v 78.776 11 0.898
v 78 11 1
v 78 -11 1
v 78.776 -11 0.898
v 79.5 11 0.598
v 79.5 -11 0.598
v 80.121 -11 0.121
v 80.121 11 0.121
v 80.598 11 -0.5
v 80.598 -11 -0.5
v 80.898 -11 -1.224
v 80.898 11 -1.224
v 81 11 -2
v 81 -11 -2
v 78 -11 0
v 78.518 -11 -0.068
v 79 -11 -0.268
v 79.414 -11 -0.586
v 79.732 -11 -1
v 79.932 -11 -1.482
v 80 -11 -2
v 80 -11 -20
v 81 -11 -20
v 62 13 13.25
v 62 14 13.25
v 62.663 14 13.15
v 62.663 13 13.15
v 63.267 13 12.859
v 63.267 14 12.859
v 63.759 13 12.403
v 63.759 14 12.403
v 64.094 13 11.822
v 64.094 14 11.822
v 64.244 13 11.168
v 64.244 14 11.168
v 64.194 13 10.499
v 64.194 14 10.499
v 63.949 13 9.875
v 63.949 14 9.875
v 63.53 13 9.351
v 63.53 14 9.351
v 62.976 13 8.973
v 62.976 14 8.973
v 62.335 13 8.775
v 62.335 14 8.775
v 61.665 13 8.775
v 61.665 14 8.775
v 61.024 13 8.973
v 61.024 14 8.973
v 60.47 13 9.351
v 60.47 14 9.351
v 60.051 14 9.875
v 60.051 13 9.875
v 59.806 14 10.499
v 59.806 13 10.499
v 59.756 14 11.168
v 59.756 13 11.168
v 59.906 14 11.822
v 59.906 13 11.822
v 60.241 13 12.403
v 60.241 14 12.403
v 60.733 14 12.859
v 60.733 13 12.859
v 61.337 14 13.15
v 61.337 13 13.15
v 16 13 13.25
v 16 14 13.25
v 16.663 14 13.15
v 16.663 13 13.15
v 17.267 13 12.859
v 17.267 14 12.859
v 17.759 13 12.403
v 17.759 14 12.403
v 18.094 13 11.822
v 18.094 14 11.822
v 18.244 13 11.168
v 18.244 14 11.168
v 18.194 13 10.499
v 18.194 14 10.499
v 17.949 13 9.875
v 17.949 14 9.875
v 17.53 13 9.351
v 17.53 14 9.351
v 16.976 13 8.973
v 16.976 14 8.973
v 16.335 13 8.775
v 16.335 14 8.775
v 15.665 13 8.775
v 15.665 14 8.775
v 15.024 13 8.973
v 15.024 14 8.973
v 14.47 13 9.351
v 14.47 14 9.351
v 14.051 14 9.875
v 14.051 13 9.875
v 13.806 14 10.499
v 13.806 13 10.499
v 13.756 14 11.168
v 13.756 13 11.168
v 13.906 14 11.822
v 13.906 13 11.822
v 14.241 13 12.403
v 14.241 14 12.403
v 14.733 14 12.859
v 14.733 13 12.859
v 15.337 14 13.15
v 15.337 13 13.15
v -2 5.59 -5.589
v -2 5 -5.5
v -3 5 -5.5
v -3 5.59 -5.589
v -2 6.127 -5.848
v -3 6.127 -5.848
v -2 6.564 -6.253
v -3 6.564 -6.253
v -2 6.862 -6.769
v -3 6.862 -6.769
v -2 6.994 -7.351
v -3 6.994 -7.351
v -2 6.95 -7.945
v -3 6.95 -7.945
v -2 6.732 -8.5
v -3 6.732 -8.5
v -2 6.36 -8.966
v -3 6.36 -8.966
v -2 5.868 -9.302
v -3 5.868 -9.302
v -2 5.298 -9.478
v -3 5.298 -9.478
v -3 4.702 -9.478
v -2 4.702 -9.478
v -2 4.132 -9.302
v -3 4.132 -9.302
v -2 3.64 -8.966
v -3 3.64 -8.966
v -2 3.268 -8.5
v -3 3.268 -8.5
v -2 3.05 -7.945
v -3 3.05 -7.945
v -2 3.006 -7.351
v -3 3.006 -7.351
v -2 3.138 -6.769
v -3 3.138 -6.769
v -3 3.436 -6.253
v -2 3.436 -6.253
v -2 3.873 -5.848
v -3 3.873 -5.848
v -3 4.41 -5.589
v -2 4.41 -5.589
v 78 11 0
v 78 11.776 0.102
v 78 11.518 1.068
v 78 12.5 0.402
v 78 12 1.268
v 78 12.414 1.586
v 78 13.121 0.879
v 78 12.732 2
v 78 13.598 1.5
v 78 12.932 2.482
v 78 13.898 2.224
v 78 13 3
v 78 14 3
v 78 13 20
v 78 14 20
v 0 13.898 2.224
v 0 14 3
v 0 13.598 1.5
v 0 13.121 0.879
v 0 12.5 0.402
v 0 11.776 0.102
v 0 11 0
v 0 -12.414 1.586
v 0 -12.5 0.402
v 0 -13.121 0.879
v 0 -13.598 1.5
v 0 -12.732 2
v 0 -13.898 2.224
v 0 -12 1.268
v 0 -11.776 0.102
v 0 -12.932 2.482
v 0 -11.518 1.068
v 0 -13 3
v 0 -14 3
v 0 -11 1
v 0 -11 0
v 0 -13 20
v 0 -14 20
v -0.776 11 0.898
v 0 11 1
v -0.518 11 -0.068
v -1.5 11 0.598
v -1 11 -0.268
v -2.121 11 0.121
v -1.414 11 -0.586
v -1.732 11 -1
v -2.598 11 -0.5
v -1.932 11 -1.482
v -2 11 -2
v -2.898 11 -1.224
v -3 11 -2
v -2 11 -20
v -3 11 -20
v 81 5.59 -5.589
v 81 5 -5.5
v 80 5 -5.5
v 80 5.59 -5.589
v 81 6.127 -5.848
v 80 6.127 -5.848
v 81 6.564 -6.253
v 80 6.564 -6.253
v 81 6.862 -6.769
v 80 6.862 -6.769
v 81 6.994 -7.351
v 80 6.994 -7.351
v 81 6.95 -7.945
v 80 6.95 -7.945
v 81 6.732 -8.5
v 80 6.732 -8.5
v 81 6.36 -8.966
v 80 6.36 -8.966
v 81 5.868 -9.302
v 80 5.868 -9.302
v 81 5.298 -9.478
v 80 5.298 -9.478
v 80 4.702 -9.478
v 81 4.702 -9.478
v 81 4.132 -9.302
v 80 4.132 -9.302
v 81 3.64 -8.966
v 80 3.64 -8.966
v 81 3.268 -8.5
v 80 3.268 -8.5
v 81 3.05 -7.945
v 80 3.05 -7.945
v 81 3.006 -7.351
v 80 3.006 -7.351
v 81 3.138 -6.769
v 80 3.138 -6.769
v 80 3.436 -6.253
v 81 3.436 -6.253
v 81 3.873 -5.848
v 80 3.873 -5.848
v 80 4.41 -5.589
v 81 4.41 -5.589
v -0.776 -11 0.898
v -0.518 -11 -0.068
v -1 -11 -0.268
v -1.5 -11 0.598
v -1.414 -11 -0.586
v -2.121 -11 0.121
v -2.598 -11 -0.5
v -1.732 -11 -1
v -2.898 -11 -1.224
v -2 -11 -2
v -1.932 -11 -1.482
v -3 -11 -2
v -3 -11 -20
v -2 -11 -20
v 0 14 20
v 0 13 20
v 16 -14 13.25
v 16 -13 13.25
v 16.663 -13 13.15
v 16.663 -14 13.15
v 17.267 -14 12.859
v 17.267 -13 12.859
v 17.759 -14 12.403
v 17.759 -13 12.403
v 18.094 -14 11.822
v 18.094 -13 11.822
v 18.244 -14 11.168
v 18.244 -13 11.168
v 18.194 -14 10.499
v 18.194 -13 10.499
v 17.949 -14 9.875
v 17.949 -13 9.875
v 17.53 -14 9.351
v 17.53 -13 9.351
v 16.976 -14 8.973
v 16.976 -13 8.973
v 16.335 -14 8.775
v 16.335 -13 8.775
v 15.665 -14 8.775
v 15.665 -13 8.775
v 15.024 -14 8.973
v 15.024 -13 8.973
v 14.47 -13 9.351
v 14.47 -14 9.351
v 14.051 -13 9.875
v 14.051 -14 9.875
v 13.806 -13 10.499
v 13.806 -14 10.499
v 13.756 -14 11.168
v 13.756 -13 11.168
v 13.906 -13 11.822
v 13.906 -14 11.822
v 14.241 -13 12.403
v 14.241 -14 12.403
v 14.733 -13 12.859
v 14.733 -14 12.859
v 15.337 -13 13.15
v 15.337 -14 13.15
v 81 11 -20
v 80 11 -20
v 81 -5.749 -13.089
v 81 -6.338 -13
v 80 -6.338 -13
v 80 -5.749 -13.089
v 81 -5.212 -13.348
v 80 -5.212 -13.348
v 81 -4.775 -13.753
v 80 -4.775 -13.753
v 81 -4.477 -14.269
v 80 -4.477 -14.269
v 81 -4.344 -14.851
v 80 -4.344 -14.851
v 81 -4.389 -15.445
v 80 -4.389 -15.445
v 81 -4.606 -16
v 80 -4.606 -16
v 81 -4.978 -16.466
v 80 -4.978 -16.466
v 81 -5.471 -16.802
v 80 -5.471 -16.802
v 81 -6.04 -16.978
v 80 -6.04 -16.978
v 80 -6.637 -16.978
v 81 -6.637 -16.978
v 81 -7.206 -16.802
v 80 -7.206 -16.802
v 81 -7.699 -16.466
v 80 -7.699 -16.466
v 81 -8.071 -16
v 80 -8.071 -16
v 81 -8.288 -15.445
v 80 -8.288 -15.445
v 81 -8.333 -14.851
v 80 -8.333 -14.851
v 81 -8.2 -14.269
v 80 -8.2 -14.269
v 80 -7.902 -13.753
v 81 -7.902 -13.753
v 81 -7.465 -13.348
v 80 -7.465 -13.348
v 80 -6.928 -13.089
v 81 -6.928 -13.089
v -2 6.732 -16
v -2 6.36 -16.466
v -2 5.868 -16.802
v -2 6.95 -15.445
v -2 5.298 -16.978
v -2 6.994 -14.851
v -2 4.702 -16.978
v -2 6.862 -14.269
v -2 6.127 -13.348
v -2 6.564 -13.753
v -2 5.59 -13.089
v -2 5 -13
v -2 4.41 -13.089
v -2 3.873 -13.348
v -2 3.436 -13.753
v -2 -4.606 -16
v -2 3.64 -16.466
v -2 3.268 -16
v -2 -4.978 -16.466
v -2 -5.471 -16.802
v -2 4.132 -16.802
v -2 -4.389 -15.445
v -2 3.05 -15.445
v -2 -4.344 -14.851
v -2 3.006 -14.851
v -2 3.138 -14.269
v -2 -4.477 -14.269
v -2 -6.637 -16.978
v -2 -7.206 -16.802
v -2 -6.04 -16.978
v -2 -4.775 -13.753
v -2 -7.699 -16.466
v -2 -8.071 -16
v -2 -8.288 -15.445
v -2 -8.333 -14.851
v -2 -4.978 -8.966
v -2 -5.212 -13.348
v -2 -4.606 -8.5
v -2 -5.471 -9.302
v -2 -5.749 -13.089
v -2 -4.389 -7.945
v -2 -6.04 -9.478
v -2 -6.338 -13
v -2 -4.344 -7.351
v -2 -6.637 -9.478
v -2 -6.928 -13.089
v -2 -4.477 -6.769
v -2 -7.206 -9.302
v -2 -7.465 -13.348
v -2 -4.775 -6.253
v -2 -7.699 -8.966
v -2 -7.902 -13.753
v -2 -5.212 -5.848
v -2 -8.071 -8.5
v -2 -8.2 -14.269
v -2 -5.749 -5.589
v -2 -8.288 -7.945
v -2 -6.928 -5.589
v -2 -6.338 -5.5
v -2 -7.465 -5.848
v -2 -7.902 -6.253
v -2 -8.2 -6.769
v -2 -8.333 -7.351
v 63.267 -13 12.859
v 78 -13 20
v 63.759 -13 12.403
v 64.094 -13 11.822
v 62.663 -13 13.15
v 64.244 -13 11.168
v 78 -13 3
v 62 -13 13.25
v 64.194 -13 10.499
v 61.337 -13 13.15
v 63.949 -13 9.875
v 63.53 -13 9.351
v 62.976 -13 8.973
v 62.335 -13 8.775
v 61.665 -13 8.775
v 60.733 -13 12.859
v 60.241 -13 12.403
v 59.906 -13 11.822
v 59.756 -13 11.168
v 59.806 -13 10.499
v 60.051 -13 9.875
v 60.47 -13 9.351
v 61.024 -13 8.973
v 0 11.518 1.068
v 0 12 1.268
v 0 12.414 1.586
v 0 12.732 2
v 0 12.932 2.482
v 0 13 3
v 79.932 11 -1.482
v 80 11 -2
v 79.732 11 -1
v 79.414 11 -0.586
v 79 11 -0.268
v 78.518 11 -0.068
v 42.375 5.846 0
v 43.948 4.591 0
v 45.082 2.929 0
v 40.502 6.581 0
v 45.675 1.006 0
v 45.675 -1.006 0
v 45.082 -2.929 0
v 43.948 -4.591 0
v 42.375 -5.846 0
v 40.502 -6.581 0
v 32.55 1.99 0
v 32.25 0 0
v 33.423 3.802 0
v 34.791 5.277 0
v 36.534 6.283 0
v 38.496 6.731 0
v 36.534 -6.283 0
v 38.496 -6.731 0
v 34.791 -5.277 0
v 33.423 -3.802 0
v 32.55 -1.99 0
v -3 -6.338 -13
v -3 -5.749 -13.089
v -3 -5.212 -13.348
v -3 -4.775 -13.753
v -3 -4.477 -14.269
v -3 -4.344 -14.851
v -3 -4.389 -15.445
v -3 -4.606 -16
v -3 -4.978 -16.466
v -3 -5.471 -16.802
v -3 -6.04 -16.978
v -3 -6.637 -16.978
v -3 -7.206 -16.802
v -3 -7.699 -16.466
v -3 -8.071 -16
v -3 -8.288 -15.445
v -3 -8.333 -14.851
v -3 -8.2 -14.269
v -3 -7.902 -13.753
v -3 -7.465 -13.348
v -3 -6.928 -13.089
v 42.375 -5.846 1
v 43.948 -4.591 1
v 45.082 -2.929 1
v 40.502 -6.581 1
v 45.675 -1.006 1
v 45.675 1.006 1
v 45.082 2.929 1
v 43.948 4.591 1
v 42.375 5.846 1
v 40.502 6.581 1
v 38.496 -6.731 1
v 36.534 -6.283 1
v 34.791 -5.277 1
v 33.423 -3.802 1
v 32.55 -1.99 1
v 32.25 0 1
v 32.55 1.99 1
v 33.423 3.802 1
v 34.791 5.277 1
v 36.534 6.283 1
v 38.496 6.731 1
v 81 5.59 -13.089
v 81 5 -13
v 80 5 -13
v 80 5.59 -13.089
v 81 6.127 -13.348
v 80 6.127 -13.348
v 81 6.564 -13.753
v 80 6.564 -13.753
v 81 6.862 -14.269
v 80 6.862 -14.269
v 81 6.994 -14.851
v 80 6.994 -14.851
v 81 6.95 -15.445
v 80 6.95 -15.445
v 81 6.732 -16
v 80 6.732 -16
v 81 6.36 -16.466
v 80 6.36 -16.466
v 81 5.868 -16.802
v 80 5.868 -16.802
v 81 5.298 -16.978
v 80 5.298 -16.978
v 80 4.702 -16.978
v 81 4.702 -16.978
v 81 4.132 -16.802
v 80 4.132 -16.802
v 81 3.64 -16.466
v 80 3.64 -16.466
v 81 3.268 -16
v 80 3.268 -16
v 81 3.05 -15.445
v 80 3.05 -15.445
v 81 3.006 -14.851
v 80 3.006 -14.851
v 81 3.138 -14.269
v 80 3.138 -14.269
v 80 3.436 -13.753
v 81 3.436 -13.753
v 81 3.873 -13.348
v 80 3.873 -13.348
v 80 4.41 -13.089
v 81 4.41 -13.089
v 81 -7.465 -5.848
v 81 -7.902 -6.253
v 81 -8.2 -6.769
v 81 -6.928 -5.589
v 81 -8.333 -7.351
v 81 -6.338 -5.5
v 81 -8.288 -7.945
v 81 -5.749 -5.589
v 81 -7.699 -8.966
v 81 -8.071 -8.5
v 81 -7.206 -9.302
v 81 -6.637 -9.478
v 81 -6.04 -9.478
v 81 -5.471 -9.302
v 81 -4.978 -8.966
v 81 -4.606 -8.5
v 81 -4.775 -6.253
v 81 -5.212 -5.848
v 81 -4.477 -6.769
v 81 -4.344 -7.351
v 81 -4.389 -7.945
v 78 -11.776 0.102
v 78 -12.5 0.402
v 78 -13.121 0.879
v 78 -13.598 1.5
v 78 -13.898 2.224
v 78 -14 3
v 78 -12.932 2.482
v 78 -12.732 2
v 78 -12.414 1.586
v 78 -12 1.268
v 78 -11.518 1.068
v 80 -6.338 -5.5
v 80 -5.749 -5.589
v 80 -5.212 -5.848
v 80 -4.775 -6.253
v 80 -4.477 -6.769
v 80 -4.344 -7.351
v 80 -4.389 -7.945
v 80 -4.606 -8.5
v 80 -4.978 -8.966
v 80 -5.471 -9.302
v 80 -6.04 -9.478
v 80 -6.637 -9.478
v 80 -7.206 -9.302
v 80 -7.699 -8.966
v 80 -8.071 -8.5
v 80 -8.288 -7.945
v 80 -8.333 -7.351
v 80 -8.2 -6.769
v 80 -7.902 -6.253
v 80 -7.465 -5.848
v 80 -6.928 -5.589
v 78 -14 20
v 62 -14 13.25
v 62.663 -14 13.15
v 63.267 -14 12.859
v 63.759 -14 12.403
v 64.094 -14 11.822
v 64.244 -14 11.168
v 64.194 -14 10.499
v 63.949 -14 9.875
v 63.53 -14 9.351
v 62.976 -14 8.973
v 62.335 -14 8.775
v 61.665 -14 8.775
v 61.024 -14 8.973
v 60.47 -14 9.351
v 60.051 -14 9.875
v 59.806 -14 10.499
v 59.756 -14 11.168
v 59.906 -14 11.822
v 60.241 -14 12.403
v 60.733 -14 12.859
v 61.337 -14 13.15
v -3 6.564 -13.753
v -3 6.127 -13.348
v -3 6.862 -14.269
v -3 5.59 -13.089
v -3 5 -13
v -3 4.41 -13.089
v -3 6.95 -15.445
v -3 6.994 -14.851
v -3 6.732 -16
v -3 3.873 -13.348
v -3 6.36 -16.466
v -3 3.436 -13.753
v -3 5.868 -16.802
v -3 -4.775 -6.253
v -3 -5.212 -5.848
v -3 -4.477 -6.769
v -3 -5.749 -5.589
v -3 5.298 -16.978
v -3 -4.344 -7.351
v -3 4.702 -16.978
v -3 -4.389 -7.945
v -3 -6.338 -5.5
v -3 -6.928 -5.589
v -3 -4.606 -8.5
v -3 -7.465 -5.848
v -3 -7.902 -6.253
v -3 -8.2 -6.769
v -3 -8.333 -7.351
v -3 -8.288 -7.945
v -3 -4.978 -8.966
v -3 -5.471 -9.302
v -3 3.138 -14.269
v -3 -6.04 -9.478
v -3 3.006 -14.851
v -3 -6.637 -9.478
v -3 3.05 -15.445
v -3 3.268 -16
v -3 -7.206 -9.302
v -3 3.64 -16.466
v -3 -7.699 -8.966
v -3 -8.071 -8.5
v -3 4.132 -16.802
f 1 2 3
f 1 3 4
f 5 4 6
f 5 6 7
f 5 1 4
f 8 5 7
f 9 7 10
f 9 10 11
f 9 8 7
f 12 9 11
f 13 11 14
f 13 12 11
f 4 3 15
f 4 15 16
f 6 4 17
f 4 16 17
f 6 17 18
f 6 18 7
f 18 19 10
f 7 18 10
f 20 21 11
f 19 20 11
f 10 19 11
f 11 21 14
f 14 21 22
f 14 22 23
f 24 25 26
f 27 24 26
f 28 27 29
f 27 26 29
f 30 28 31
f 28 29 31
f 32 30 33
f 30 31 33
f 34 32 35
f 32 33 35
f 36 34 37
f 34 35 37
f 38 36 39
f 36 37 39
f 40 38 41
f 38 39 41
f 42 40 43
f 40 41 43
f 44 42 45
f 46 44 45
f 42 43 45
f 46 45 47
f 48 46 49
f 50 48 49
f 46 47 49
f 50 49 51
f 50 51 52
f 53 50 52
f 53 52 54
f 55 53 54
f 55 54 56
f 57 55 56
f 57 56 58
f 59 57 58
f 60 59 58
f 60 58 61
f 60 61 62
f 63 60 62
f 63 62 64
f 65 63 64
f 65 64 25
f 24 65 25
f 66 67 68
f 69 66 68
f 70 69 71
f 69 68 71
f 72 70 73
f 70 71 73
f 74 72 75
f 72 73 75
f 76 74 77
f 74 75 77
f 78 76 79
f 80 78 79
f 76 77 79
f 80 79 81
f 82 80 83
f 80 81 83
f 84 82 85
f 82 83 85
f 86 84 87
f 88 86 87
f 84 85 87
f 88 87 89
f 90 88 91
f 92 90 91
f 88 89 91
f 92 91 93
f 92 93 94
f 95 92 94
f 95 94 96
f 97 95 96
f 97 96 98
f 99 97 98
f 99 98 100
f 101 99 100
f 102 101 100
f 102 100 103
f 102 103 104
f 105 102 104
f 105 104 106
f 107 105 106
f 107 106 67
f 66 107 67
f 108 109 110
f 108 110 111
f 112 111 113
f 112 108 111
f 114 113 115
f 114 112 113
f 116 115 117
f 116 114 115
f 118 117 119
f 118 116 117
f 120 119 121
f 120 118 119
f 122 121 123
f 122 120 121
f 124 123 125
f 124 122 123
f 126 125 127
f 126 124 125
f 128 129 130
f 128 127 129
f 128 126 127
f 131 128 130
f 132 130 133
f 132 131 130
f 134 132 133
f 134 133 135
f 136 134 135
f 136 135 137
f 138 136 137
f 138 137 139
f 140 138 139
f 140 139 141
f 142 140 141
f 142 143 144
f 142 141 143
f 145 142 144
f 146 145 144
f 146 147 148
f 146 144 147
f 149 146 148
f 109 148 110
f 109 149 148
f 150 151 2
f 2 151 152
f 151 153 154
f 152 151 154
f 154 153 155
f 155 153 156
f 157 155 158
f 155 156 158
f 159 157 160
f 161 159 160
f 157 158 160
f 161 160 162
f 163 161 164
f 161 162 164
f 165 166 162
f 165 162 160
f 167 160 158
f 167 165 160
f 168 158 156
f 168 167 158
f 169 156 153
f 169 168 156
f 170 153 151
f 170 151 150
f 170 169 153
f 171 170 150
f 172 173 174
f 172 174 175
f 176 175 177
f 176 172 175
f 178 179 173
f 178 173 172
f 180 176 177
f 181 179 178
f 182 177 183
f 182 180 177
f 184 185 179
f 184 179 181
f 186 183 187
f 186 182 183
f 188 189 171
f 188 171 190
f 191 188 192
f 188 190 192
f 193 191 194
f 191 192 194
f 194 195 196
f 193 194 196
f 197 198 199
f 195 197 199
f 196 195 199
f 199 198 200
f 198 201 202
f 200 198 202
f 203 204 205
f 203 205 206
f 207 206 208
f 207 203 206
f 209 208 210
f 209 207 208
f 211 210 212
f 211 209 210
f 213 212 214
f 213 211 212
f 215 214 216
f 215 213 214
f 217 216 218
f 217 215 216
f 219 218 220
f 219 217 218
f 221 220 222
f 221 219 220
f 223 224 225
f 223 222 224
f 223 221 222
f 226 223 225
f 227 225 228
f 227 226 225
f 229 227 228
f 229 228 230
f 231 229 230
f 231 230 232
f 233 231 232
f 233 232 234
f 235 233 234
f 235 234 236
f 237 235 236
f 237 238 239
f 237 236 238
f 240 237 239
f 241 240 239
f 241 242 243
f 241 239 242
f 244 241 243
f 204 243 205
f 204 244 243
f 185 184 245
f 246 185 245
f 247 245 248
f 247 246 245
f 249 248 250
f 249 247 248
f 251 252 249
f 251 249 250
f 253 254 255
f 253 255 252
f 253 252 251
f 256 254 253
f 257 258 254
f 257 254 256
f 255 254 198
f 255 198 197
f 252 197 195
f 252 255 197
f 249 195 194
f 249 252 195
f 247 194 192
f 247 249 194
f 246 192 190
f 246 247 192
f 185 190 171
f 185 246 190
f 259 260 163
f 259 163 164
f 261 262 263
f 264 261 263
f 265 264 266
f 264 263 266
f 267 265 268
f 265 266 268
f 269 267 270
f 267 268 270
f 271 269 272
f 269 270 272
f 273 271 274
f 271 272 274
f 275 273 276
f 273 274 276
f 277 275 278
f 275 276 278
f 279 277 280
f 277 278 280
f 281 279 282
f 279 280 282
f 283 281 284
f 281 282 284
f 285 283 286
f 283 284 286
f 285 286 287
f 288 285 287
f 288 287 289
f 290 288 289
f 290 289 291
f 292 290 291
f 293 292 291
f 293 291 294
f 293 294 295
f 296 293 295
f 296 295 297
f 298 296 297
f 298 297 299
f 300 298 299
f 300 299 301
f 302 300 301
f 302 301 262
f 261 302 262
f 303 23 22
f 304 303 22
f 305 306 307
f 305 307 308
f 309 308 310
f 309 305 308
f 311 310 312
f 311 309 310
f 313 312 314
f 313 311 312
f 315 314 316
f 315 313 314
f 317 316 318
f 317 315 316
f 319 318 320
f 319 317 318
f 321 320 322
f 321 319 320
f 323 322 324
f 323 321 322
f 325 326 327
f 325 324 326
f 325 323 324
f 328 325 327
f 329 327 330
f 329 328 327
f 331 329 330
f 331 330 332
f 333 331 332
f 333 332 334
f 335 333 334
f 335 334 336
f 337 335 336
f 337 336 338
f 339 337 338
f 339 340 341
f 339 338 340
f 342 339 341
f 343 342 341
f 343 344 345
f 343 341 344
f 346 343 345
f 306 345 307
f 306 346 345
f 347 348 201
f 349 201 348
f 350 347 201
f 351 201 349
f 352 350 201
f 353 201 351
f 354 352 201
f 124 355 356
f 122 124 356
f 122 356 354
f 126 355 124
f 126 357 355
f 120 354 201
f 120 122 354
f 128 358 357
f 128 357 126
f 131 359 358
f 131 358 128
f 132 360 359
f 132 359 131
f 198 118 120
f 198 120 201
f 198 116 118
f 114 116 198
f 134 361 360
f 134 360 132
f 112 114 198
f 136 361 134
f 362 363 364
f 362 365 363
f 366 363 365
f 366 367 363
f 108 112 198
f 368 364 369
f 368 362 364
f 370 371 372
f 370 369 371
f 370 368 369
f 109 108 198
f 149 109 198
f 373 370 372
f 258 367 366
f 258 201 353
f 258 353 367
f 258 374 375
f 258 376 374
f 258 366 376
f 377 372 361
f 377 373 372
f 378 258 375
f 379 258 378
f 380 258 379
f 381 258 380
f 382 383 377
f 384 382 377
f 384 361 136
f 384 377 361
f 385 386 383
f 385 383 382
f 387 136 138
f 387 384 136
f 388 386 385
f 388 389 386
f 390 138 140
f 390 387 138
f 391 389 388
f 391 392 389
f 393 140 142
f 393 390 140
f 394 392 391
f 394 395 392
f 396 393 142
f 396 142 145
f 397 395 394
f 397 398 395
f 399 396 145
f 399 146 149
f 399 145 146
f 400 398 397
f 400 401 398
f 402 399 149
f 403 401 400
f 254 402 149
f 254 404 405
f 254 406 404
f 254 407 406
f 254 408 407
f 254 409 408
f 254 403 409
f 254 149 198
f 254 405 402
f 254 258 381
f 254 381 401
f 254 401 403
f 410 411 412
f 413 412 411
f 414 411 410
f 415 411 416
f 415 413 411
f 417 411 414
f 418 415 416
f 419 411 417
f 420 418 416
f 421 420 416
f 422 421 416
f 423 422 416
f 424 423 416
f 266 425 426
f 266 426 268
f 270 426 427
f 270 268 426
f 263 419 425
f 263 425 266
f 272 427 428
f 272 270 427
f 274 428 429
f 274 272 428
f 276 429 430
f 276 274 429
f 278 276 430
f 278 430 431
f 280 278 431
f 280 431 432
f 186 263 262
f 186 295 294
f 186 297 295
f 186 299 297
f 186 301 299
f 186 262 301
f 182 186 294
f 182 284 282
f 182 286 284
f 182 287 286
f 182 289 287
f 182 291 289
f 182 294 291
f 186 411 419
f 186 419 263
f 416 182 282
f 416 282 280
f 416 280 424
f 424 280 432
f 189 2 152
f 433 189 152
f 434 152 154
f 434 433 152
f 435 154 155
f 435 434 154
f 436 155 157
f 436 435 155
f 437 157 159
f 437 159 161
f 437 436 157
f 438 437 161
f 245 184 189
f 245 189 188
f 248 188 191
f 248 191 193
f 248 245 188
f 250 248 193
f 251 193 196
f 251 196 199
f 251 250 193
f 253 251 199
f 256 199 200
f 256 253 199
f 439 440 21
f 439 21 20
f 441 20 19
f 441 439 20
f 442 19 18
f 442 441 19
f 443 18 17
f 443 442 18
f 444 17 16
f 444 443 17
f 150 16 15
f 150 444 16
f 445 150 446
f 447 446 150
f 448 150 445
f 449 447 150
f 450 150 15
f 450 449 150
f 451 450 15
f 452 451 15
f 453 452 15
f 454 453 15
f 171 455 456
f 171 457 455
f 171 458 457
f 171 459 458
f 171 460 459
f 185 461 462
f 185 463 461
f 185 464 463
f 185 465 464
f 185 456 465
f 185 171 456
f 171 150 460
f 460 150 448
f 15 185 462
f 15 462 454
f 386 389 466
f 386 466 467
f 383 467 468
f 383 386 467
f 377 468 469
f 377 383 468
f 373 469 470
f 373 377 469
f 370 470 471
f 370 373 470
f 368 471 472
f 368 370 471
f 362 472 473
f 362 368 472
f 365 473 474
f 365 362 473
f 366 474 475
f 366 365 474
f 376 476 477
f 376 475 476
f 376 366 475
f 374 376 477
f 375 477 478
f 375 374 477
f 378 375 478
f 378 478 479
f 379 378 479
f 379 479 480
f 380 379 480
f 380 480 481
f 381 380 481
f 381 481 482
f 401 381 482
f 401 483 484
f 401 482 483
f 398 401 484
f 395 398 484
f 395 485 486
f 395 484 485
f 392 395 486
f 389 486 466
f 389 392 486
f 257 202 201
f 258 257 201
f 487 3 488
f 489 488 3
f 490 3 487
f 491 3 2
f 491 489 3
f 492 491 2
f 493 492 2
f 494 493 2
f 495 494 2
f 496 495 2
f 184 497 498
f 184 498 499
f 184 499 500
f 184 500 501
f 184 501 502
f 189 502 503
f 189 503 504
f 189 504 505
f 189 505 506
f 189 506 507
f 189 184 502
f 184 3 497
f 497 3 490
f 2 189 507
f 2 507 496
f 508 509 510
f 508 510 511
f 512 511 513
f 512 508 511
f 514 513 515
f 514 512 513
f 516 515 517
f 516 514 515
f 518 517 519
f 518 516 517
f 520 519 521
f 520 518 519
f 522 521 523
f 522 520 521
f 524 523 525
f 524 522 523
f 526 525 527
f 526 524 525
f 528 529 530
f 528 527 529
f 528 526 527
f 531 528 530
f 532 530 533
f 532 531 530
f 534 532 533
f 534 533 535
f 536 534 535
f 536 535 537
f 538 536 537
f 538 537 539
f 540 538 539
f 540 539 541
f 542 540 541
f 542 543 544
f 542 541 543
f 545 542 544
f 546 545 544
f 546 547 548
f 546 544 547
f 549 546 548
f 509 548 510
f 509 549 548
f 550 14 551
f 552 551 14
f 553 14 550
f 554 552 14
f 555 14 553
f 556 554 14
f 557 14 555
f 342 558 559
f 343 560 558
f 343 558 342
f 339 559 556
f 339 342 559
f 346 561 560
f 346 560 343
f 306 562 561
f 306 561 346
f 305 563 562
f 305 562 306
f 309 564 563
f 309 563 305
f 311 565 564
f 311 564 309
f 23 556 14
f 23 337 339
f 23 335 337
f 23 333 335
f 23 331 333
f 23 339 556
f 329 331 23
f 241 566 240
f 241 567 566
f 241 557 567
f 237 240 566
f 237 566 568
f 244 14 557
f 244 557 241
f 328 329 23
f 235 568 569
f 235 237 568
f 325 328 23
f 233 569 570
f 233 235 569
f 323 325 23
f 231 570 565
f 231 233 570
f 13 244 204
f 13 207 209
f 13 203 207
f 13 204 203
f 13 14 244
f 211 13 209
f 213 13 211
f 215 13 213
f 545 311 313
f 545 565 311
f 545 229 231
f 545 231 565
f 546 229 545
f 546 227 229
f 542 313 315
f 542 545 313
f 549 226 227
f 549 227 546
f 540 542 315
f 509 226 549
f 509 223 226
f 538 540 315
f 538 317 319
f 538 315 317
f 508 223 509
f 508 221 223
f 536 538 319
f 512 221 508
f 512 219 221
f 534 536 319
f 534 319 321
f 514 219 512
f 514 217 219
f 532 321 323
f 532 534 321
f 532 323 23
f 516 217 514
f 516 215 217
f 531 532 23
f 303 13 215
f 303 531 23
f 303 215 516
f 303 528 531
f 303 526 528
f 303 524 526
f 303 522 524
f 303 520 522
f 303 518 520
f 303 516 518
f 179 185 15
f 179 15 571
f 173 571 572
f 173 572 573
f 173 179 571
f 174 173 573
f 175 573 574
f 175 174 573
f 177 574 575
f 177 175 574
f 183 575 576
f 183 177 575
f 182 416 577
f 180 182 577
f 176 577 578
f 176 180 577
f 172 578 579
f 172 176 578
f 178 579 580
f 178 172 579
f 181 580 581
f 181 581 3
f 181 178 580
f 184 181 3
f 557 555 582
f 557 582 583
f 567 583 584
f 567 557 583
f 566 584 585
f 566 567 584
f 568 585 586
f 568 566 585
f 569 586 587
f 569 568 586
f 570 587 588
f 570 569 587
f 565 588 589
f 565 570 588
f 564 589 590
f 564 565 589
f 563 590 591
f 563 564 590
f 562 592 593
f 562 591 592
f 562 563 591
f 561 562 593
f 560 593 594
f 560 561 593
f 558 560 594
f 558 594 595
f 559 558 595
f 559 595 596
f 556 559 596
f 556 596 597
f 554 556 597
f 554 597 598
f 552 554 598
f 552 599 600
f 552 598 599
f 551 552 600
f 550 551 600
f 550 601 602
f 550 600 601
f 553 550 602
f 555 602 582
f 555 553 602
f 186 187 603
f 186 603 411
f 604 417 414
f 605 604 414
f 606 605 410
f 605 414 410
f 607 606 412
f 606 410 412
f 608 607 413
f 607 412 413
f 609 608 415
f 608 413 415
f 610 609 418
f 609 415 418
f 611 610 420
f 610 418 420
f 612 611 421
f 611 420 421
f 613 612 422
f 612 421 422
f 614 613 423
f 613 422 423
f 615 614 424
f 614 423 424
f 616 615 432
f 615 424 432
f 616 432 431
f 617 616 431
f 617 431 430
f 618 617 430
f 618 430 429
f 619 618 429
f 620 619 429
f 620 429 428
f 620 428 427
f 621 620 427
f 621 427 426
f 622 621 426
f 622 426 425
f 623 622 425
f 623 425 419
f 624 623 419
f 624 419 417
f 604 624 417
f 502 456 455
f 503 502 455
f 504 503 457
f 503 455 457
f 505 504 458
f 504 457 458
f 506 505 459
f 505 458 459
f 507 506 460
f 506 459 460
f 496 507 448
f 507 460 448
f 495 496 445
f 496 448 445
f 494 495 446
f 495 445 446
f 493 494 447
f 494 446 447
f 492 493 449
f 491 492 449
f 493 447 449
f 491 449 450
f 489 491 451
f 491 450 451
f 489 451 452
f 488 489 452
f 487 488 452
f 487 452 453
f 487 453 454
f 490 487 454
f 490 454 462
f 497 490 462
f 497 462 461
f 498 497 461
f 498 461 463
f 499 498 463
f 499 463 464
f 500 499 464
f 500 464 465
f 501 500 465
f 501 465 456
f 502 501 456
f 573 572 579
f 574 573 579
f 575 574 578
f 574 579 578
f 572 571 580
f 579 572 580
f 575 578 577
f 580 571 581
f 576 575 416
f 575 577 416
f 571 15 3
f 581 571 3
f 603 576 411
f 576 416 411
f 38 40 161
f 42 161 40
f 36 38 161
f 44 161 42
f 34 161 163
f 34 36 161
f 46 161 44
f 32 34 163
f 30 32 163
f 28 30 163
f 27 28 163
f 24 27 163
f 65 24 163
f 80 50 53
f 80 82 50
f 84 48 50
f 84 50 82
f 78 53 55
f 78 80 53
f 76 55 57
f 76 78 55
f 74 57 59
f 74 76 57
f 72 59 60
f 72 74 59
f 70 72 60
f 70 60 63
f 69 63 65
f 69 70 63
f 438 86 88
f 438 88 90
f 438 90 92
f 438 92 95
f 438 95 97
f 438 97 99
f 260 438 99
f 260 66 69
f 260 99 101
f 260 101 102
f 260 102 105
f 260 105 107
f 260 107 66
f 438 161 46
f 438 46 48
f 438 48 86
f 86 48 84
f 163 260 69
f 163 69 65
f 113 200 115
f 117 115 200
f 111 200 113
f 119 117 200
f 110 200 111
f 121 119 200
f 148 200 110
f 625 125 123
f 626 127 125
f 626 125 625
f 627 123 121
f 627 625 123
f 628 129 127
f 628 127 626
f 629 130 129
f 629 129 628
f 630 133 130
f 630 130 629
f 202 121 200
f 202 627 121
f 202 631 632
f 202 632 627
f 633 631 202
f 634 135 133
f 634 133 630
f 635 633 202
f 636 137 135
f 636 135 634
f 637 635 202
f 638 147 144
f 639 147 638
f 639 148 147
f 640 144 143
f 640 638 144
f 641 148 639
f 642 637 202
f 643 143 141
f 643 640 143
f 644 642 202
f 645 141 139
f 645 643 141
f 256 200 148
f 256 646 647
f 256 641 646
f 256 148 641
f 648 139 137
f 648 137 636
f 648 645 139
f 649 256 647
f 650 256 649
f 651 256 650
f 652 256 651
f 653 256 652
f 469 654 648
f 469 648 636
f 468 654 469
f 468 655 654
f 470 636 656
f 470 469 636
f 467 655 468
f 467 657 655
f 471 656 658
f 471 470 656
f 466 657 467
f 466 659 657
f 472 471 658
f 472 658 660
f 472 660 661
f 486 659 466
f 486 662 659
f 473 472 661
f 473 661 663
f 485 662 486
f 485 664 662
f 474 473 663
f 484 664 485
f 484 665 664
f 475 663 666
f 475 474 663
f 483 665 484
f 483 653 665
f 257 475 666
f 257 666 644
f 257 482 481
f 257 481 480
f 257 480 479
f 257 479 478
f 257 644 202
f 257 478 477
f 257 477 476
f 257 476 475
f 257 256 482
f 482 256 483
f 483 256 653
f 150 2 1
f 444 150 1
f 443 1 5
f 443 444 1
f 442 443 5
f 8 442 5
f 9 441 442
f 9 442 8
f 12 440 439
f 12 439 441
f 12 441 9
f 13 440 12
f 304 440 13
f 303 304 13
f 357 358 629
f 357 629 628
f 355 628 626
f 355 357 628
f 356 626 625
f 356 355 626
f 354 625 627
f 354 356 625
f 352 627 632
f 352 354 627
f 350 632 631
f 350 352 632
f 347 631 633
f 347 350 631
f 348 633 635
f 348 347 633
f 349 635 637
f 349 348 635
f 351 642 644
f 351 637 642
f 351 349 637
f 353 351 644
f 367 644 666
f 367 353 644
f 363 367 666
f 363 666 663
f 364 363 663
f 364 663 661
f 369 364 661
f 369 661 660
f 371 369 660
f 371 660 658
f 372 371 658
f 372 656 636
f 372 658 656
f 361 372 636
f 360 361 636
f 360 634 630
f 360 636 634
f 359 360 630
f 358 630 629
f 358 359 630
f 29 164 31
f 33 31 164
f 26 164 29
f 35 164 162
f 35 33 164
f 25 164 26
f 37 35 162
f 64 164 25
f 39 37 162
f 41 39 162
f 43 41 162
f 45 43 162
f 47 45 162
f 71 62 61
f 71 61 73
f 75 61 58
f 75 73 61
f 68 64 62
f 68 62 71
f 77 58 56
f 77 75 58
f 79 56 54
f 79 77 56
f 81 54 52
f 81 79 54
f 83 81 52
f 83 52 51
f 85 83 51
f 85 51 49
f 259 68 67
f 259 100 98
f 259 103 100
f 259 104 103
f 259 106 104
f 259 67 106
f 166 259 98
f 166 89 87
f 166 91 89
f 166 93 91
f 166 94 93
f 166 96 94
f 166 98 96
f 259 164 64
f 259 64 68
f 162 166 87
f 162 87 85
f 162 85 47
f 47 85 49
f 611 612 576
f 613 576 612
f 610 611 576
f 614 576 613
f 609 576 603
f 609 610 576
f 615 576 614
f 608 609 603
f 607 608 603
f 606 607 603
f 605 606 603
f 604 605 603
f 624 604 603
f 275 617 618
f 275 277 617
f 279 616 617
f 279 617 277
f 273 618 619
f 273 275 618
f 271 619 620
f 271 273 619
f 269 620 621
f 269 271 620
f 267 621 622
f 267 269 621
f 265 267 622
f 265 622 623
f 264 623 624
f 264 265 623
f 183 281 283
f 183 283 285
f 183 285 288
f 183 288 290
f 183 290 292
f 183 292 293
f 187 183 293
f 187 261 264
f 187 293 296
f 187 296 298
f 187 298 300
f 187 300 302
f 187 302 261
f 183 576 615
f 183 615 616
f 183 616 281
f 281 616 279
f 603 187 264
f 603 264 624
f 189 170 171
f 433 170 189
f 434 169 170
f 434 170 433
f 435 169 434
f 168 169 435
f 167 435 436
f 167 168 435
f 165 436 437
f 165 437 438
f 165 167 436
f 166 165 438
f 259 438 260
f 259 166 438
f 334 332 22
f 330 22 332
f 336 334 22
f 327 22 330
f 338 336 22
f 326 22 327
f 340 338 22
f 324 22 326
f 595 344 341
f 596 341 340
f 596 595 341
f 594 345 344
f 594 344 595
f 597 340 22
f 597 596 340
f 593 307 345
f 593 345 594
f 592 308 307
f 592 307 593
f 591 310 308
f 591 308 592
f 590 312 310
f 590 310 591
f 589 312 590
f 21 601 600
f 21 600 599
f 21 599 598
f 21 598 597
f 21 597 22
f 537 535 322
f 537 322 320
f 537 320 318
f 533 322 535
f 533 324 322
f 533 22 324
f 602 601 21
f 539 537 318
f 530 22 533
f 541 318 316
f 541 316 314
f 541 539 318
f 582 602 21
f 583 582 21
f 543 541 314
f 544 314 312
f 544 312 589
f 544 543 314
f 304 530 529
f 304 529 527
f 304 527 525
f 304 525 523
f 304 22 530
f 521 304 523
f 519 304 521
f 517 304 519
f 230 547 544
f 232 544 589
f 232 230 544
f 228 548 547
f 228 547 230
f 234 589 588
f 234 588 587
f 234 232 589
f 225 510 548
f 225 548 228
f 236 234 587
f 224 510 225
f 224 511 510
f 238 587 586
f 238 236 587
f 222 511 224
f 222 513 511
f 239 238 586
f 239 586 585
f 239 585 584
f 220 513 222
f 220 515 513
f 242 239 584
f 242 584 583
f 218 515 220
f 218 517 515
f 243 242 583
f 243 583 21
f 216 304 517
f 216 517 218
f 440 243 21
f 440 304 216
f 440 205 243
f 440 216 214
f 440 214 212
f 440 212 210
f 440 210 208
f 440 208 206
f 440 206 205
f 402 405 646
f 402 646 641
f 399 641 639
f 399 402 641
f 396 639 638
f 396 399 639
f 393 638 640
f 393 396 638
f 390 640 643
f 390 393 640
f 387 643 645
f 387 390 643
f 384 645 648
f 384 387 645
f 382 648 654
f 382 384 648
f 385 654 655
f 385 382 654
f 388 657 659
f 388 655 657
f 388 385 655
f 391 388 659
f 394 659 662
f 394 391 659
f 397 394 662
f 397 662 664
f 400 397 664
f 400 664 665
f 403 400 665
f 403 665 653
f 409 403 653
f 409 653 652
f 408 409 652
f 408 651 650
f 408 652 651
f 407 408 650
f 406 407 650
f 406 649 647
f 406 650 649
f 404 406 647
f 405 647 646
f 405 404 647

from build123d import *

# Parameters (mm, degrees)
BASE_FLANGE1_DEPTH      = 78
EDGE_FLANGE1_DEPTH      = 22
EDGE_FLANGE1_BEND_DEPTH = 22
SKETCH14_R              = 2.25
CUT_EXTRUDE1_DEPTH      = 33
SKETCH15_R              = 6.75
CUT_EXTRUDE2_DEPTH      = 85.599054368
CUT_EXTRUDE3_DEPTH      = 88.475710915
CUT_EXTRUDE3_DEPTH_BACK = 88.475710915
SKETCH16_R              = 2


# Sheet-metal steps are written as plain solids
with BuildPart() as part:
    # Sketch3 → Base-Flange1 (new body)
    with BuildSketch(Plane(origin=(0, 0, 0), x_dir=(0, 0, -1), z_dir=(1, 0, 0))):
        with BuildLine():
            Line((-20, 14), (-3, 14))
            ThreePointArc((-3, 14), (-0.878679656, 13.121320344), (0, 11))
            Line((0, 11), (0, -11))
            ThreePointArc((0, -11), (-0.878679656, -13.121320344), (-3, -14))
            Line((-3, -14), (-20, -14))
            Line((-20, -14), (-20, -13))
            Line((-20, -13), (-3, -13))
            ThreePointArc((-3, -13), (-1.585786438, -12.414213562), (-1, -11))
            Line((-1, -11), (-1, 11))
            ThreePointArc((-1, 11), (-1.585786438, 12.414213562), (-3, 13))
            Line((-3, 13), (-20, 13))
            Line((-20, 13), (-20, 14))
        make_face()
    extrude(amount=BASE_FLANGE1_DEPTH)

    # Edge-Flange1 section (across the edge) → Edge-Flange1 (add)
    with BuildSketch(Plane(origin=(80, 11, 0), x_dir=(-1, 0, 0), z_dir=(0, -1, 0))):
        with BuildLine():
            Line((-1, 2), (-1, 20))
            Line((-1, 20), (0, 20))
            Line((0, 20), (0, 2))
            ThreePointArc((0, 2), (0.585786438, 0.585786438), (2, 0))
            Line((2, 0), (2, -1))
            ThreePointArc((2, -1), (-0.121320344, -0.121320344), (-1, 2))
        make_face()
    extrude(amount=EDGE_FLANGE1_DEPTH)

    # Edge-Flange1 section 2 (across the edge) → Edge-Flange1 bend (add)
    with BuildSketch(Plane(origin=(-2, -11, 0), x_dir=(1, 0, 0), z_dir=(0, 1, 0))):
        with BuildLine():
            Line((-1, 2), (-1, 20))
            Line((-1, 20), (0, 20))
            Line((0, 20), (0, 2))
            ThreePointArc((0, 2), (0.585786438, 0.585786438), (2, 0))
            Line((2, 0), (2, -1))
            ThreePointArc((2, -1), (-0.121320344, -0.121320344), (-1, 2))
        make_face()
    extrude(amount=EDGE_FLANGE1_BEND_DEPTH)

    # Sketch14 → Cut-Extrude1 (cut)
    with BuildSketch(Plane(origin=(0, 14, 0), x_dir=(1, 0, 0), z_dir=(0, 1, 0))):
        with Locations(Location((16, -11, 0), (0, 0, 270))):
            Circle(SKETCH14_R)
        with Locations(Location((62, -11, 0), (0, 0, 270))):
            Circle(SKETCH14_R)
    extrude(amount=-CUT_EXTRUDE1_DEPTH, mode=Mode.SUBTRACT)

    # Sketch15 → Cut-Extrude2 (cut, through all)
    with BuildSketch(Plane(origin=(0, 0, 0), x_dir=(-1, 0, 0), z_dir=(0, 0, -1))):
        with Locations((-39, 0)):
            Circle(SKETCH15_R)
    extrude(amount=-CUT_EXTRUDE2_DEPTH, mode=Mode.SUBTRACT)

    # Sketch16 → Cut-Extrude3 (cut, two sides: drawn at the far end of the back side and taken through both)
    with BuildSketch(Plane.ZY.offset(3).offset(-CUT_EXTRUDE3_DEPTH_BACK)):
        with Locations((-15, 5)):
            Circle(SKETCH16_R)
        with Locations((-7.5, 5)):
            Circle(SKETCH16_R)
        with Locations((-7.5, -6.338473389)):
            Circle(SKETCH16_R)
        with Locations((-15, -6.338473389)):
            Circle(SKETCH16_R)
    extrude(amount=CUT_EXTRUDE3_DEPTH + CUT_EXTRUDE3_DEPTH_BACK, mode=Mode.SUBTRACT)


solid = part.part
